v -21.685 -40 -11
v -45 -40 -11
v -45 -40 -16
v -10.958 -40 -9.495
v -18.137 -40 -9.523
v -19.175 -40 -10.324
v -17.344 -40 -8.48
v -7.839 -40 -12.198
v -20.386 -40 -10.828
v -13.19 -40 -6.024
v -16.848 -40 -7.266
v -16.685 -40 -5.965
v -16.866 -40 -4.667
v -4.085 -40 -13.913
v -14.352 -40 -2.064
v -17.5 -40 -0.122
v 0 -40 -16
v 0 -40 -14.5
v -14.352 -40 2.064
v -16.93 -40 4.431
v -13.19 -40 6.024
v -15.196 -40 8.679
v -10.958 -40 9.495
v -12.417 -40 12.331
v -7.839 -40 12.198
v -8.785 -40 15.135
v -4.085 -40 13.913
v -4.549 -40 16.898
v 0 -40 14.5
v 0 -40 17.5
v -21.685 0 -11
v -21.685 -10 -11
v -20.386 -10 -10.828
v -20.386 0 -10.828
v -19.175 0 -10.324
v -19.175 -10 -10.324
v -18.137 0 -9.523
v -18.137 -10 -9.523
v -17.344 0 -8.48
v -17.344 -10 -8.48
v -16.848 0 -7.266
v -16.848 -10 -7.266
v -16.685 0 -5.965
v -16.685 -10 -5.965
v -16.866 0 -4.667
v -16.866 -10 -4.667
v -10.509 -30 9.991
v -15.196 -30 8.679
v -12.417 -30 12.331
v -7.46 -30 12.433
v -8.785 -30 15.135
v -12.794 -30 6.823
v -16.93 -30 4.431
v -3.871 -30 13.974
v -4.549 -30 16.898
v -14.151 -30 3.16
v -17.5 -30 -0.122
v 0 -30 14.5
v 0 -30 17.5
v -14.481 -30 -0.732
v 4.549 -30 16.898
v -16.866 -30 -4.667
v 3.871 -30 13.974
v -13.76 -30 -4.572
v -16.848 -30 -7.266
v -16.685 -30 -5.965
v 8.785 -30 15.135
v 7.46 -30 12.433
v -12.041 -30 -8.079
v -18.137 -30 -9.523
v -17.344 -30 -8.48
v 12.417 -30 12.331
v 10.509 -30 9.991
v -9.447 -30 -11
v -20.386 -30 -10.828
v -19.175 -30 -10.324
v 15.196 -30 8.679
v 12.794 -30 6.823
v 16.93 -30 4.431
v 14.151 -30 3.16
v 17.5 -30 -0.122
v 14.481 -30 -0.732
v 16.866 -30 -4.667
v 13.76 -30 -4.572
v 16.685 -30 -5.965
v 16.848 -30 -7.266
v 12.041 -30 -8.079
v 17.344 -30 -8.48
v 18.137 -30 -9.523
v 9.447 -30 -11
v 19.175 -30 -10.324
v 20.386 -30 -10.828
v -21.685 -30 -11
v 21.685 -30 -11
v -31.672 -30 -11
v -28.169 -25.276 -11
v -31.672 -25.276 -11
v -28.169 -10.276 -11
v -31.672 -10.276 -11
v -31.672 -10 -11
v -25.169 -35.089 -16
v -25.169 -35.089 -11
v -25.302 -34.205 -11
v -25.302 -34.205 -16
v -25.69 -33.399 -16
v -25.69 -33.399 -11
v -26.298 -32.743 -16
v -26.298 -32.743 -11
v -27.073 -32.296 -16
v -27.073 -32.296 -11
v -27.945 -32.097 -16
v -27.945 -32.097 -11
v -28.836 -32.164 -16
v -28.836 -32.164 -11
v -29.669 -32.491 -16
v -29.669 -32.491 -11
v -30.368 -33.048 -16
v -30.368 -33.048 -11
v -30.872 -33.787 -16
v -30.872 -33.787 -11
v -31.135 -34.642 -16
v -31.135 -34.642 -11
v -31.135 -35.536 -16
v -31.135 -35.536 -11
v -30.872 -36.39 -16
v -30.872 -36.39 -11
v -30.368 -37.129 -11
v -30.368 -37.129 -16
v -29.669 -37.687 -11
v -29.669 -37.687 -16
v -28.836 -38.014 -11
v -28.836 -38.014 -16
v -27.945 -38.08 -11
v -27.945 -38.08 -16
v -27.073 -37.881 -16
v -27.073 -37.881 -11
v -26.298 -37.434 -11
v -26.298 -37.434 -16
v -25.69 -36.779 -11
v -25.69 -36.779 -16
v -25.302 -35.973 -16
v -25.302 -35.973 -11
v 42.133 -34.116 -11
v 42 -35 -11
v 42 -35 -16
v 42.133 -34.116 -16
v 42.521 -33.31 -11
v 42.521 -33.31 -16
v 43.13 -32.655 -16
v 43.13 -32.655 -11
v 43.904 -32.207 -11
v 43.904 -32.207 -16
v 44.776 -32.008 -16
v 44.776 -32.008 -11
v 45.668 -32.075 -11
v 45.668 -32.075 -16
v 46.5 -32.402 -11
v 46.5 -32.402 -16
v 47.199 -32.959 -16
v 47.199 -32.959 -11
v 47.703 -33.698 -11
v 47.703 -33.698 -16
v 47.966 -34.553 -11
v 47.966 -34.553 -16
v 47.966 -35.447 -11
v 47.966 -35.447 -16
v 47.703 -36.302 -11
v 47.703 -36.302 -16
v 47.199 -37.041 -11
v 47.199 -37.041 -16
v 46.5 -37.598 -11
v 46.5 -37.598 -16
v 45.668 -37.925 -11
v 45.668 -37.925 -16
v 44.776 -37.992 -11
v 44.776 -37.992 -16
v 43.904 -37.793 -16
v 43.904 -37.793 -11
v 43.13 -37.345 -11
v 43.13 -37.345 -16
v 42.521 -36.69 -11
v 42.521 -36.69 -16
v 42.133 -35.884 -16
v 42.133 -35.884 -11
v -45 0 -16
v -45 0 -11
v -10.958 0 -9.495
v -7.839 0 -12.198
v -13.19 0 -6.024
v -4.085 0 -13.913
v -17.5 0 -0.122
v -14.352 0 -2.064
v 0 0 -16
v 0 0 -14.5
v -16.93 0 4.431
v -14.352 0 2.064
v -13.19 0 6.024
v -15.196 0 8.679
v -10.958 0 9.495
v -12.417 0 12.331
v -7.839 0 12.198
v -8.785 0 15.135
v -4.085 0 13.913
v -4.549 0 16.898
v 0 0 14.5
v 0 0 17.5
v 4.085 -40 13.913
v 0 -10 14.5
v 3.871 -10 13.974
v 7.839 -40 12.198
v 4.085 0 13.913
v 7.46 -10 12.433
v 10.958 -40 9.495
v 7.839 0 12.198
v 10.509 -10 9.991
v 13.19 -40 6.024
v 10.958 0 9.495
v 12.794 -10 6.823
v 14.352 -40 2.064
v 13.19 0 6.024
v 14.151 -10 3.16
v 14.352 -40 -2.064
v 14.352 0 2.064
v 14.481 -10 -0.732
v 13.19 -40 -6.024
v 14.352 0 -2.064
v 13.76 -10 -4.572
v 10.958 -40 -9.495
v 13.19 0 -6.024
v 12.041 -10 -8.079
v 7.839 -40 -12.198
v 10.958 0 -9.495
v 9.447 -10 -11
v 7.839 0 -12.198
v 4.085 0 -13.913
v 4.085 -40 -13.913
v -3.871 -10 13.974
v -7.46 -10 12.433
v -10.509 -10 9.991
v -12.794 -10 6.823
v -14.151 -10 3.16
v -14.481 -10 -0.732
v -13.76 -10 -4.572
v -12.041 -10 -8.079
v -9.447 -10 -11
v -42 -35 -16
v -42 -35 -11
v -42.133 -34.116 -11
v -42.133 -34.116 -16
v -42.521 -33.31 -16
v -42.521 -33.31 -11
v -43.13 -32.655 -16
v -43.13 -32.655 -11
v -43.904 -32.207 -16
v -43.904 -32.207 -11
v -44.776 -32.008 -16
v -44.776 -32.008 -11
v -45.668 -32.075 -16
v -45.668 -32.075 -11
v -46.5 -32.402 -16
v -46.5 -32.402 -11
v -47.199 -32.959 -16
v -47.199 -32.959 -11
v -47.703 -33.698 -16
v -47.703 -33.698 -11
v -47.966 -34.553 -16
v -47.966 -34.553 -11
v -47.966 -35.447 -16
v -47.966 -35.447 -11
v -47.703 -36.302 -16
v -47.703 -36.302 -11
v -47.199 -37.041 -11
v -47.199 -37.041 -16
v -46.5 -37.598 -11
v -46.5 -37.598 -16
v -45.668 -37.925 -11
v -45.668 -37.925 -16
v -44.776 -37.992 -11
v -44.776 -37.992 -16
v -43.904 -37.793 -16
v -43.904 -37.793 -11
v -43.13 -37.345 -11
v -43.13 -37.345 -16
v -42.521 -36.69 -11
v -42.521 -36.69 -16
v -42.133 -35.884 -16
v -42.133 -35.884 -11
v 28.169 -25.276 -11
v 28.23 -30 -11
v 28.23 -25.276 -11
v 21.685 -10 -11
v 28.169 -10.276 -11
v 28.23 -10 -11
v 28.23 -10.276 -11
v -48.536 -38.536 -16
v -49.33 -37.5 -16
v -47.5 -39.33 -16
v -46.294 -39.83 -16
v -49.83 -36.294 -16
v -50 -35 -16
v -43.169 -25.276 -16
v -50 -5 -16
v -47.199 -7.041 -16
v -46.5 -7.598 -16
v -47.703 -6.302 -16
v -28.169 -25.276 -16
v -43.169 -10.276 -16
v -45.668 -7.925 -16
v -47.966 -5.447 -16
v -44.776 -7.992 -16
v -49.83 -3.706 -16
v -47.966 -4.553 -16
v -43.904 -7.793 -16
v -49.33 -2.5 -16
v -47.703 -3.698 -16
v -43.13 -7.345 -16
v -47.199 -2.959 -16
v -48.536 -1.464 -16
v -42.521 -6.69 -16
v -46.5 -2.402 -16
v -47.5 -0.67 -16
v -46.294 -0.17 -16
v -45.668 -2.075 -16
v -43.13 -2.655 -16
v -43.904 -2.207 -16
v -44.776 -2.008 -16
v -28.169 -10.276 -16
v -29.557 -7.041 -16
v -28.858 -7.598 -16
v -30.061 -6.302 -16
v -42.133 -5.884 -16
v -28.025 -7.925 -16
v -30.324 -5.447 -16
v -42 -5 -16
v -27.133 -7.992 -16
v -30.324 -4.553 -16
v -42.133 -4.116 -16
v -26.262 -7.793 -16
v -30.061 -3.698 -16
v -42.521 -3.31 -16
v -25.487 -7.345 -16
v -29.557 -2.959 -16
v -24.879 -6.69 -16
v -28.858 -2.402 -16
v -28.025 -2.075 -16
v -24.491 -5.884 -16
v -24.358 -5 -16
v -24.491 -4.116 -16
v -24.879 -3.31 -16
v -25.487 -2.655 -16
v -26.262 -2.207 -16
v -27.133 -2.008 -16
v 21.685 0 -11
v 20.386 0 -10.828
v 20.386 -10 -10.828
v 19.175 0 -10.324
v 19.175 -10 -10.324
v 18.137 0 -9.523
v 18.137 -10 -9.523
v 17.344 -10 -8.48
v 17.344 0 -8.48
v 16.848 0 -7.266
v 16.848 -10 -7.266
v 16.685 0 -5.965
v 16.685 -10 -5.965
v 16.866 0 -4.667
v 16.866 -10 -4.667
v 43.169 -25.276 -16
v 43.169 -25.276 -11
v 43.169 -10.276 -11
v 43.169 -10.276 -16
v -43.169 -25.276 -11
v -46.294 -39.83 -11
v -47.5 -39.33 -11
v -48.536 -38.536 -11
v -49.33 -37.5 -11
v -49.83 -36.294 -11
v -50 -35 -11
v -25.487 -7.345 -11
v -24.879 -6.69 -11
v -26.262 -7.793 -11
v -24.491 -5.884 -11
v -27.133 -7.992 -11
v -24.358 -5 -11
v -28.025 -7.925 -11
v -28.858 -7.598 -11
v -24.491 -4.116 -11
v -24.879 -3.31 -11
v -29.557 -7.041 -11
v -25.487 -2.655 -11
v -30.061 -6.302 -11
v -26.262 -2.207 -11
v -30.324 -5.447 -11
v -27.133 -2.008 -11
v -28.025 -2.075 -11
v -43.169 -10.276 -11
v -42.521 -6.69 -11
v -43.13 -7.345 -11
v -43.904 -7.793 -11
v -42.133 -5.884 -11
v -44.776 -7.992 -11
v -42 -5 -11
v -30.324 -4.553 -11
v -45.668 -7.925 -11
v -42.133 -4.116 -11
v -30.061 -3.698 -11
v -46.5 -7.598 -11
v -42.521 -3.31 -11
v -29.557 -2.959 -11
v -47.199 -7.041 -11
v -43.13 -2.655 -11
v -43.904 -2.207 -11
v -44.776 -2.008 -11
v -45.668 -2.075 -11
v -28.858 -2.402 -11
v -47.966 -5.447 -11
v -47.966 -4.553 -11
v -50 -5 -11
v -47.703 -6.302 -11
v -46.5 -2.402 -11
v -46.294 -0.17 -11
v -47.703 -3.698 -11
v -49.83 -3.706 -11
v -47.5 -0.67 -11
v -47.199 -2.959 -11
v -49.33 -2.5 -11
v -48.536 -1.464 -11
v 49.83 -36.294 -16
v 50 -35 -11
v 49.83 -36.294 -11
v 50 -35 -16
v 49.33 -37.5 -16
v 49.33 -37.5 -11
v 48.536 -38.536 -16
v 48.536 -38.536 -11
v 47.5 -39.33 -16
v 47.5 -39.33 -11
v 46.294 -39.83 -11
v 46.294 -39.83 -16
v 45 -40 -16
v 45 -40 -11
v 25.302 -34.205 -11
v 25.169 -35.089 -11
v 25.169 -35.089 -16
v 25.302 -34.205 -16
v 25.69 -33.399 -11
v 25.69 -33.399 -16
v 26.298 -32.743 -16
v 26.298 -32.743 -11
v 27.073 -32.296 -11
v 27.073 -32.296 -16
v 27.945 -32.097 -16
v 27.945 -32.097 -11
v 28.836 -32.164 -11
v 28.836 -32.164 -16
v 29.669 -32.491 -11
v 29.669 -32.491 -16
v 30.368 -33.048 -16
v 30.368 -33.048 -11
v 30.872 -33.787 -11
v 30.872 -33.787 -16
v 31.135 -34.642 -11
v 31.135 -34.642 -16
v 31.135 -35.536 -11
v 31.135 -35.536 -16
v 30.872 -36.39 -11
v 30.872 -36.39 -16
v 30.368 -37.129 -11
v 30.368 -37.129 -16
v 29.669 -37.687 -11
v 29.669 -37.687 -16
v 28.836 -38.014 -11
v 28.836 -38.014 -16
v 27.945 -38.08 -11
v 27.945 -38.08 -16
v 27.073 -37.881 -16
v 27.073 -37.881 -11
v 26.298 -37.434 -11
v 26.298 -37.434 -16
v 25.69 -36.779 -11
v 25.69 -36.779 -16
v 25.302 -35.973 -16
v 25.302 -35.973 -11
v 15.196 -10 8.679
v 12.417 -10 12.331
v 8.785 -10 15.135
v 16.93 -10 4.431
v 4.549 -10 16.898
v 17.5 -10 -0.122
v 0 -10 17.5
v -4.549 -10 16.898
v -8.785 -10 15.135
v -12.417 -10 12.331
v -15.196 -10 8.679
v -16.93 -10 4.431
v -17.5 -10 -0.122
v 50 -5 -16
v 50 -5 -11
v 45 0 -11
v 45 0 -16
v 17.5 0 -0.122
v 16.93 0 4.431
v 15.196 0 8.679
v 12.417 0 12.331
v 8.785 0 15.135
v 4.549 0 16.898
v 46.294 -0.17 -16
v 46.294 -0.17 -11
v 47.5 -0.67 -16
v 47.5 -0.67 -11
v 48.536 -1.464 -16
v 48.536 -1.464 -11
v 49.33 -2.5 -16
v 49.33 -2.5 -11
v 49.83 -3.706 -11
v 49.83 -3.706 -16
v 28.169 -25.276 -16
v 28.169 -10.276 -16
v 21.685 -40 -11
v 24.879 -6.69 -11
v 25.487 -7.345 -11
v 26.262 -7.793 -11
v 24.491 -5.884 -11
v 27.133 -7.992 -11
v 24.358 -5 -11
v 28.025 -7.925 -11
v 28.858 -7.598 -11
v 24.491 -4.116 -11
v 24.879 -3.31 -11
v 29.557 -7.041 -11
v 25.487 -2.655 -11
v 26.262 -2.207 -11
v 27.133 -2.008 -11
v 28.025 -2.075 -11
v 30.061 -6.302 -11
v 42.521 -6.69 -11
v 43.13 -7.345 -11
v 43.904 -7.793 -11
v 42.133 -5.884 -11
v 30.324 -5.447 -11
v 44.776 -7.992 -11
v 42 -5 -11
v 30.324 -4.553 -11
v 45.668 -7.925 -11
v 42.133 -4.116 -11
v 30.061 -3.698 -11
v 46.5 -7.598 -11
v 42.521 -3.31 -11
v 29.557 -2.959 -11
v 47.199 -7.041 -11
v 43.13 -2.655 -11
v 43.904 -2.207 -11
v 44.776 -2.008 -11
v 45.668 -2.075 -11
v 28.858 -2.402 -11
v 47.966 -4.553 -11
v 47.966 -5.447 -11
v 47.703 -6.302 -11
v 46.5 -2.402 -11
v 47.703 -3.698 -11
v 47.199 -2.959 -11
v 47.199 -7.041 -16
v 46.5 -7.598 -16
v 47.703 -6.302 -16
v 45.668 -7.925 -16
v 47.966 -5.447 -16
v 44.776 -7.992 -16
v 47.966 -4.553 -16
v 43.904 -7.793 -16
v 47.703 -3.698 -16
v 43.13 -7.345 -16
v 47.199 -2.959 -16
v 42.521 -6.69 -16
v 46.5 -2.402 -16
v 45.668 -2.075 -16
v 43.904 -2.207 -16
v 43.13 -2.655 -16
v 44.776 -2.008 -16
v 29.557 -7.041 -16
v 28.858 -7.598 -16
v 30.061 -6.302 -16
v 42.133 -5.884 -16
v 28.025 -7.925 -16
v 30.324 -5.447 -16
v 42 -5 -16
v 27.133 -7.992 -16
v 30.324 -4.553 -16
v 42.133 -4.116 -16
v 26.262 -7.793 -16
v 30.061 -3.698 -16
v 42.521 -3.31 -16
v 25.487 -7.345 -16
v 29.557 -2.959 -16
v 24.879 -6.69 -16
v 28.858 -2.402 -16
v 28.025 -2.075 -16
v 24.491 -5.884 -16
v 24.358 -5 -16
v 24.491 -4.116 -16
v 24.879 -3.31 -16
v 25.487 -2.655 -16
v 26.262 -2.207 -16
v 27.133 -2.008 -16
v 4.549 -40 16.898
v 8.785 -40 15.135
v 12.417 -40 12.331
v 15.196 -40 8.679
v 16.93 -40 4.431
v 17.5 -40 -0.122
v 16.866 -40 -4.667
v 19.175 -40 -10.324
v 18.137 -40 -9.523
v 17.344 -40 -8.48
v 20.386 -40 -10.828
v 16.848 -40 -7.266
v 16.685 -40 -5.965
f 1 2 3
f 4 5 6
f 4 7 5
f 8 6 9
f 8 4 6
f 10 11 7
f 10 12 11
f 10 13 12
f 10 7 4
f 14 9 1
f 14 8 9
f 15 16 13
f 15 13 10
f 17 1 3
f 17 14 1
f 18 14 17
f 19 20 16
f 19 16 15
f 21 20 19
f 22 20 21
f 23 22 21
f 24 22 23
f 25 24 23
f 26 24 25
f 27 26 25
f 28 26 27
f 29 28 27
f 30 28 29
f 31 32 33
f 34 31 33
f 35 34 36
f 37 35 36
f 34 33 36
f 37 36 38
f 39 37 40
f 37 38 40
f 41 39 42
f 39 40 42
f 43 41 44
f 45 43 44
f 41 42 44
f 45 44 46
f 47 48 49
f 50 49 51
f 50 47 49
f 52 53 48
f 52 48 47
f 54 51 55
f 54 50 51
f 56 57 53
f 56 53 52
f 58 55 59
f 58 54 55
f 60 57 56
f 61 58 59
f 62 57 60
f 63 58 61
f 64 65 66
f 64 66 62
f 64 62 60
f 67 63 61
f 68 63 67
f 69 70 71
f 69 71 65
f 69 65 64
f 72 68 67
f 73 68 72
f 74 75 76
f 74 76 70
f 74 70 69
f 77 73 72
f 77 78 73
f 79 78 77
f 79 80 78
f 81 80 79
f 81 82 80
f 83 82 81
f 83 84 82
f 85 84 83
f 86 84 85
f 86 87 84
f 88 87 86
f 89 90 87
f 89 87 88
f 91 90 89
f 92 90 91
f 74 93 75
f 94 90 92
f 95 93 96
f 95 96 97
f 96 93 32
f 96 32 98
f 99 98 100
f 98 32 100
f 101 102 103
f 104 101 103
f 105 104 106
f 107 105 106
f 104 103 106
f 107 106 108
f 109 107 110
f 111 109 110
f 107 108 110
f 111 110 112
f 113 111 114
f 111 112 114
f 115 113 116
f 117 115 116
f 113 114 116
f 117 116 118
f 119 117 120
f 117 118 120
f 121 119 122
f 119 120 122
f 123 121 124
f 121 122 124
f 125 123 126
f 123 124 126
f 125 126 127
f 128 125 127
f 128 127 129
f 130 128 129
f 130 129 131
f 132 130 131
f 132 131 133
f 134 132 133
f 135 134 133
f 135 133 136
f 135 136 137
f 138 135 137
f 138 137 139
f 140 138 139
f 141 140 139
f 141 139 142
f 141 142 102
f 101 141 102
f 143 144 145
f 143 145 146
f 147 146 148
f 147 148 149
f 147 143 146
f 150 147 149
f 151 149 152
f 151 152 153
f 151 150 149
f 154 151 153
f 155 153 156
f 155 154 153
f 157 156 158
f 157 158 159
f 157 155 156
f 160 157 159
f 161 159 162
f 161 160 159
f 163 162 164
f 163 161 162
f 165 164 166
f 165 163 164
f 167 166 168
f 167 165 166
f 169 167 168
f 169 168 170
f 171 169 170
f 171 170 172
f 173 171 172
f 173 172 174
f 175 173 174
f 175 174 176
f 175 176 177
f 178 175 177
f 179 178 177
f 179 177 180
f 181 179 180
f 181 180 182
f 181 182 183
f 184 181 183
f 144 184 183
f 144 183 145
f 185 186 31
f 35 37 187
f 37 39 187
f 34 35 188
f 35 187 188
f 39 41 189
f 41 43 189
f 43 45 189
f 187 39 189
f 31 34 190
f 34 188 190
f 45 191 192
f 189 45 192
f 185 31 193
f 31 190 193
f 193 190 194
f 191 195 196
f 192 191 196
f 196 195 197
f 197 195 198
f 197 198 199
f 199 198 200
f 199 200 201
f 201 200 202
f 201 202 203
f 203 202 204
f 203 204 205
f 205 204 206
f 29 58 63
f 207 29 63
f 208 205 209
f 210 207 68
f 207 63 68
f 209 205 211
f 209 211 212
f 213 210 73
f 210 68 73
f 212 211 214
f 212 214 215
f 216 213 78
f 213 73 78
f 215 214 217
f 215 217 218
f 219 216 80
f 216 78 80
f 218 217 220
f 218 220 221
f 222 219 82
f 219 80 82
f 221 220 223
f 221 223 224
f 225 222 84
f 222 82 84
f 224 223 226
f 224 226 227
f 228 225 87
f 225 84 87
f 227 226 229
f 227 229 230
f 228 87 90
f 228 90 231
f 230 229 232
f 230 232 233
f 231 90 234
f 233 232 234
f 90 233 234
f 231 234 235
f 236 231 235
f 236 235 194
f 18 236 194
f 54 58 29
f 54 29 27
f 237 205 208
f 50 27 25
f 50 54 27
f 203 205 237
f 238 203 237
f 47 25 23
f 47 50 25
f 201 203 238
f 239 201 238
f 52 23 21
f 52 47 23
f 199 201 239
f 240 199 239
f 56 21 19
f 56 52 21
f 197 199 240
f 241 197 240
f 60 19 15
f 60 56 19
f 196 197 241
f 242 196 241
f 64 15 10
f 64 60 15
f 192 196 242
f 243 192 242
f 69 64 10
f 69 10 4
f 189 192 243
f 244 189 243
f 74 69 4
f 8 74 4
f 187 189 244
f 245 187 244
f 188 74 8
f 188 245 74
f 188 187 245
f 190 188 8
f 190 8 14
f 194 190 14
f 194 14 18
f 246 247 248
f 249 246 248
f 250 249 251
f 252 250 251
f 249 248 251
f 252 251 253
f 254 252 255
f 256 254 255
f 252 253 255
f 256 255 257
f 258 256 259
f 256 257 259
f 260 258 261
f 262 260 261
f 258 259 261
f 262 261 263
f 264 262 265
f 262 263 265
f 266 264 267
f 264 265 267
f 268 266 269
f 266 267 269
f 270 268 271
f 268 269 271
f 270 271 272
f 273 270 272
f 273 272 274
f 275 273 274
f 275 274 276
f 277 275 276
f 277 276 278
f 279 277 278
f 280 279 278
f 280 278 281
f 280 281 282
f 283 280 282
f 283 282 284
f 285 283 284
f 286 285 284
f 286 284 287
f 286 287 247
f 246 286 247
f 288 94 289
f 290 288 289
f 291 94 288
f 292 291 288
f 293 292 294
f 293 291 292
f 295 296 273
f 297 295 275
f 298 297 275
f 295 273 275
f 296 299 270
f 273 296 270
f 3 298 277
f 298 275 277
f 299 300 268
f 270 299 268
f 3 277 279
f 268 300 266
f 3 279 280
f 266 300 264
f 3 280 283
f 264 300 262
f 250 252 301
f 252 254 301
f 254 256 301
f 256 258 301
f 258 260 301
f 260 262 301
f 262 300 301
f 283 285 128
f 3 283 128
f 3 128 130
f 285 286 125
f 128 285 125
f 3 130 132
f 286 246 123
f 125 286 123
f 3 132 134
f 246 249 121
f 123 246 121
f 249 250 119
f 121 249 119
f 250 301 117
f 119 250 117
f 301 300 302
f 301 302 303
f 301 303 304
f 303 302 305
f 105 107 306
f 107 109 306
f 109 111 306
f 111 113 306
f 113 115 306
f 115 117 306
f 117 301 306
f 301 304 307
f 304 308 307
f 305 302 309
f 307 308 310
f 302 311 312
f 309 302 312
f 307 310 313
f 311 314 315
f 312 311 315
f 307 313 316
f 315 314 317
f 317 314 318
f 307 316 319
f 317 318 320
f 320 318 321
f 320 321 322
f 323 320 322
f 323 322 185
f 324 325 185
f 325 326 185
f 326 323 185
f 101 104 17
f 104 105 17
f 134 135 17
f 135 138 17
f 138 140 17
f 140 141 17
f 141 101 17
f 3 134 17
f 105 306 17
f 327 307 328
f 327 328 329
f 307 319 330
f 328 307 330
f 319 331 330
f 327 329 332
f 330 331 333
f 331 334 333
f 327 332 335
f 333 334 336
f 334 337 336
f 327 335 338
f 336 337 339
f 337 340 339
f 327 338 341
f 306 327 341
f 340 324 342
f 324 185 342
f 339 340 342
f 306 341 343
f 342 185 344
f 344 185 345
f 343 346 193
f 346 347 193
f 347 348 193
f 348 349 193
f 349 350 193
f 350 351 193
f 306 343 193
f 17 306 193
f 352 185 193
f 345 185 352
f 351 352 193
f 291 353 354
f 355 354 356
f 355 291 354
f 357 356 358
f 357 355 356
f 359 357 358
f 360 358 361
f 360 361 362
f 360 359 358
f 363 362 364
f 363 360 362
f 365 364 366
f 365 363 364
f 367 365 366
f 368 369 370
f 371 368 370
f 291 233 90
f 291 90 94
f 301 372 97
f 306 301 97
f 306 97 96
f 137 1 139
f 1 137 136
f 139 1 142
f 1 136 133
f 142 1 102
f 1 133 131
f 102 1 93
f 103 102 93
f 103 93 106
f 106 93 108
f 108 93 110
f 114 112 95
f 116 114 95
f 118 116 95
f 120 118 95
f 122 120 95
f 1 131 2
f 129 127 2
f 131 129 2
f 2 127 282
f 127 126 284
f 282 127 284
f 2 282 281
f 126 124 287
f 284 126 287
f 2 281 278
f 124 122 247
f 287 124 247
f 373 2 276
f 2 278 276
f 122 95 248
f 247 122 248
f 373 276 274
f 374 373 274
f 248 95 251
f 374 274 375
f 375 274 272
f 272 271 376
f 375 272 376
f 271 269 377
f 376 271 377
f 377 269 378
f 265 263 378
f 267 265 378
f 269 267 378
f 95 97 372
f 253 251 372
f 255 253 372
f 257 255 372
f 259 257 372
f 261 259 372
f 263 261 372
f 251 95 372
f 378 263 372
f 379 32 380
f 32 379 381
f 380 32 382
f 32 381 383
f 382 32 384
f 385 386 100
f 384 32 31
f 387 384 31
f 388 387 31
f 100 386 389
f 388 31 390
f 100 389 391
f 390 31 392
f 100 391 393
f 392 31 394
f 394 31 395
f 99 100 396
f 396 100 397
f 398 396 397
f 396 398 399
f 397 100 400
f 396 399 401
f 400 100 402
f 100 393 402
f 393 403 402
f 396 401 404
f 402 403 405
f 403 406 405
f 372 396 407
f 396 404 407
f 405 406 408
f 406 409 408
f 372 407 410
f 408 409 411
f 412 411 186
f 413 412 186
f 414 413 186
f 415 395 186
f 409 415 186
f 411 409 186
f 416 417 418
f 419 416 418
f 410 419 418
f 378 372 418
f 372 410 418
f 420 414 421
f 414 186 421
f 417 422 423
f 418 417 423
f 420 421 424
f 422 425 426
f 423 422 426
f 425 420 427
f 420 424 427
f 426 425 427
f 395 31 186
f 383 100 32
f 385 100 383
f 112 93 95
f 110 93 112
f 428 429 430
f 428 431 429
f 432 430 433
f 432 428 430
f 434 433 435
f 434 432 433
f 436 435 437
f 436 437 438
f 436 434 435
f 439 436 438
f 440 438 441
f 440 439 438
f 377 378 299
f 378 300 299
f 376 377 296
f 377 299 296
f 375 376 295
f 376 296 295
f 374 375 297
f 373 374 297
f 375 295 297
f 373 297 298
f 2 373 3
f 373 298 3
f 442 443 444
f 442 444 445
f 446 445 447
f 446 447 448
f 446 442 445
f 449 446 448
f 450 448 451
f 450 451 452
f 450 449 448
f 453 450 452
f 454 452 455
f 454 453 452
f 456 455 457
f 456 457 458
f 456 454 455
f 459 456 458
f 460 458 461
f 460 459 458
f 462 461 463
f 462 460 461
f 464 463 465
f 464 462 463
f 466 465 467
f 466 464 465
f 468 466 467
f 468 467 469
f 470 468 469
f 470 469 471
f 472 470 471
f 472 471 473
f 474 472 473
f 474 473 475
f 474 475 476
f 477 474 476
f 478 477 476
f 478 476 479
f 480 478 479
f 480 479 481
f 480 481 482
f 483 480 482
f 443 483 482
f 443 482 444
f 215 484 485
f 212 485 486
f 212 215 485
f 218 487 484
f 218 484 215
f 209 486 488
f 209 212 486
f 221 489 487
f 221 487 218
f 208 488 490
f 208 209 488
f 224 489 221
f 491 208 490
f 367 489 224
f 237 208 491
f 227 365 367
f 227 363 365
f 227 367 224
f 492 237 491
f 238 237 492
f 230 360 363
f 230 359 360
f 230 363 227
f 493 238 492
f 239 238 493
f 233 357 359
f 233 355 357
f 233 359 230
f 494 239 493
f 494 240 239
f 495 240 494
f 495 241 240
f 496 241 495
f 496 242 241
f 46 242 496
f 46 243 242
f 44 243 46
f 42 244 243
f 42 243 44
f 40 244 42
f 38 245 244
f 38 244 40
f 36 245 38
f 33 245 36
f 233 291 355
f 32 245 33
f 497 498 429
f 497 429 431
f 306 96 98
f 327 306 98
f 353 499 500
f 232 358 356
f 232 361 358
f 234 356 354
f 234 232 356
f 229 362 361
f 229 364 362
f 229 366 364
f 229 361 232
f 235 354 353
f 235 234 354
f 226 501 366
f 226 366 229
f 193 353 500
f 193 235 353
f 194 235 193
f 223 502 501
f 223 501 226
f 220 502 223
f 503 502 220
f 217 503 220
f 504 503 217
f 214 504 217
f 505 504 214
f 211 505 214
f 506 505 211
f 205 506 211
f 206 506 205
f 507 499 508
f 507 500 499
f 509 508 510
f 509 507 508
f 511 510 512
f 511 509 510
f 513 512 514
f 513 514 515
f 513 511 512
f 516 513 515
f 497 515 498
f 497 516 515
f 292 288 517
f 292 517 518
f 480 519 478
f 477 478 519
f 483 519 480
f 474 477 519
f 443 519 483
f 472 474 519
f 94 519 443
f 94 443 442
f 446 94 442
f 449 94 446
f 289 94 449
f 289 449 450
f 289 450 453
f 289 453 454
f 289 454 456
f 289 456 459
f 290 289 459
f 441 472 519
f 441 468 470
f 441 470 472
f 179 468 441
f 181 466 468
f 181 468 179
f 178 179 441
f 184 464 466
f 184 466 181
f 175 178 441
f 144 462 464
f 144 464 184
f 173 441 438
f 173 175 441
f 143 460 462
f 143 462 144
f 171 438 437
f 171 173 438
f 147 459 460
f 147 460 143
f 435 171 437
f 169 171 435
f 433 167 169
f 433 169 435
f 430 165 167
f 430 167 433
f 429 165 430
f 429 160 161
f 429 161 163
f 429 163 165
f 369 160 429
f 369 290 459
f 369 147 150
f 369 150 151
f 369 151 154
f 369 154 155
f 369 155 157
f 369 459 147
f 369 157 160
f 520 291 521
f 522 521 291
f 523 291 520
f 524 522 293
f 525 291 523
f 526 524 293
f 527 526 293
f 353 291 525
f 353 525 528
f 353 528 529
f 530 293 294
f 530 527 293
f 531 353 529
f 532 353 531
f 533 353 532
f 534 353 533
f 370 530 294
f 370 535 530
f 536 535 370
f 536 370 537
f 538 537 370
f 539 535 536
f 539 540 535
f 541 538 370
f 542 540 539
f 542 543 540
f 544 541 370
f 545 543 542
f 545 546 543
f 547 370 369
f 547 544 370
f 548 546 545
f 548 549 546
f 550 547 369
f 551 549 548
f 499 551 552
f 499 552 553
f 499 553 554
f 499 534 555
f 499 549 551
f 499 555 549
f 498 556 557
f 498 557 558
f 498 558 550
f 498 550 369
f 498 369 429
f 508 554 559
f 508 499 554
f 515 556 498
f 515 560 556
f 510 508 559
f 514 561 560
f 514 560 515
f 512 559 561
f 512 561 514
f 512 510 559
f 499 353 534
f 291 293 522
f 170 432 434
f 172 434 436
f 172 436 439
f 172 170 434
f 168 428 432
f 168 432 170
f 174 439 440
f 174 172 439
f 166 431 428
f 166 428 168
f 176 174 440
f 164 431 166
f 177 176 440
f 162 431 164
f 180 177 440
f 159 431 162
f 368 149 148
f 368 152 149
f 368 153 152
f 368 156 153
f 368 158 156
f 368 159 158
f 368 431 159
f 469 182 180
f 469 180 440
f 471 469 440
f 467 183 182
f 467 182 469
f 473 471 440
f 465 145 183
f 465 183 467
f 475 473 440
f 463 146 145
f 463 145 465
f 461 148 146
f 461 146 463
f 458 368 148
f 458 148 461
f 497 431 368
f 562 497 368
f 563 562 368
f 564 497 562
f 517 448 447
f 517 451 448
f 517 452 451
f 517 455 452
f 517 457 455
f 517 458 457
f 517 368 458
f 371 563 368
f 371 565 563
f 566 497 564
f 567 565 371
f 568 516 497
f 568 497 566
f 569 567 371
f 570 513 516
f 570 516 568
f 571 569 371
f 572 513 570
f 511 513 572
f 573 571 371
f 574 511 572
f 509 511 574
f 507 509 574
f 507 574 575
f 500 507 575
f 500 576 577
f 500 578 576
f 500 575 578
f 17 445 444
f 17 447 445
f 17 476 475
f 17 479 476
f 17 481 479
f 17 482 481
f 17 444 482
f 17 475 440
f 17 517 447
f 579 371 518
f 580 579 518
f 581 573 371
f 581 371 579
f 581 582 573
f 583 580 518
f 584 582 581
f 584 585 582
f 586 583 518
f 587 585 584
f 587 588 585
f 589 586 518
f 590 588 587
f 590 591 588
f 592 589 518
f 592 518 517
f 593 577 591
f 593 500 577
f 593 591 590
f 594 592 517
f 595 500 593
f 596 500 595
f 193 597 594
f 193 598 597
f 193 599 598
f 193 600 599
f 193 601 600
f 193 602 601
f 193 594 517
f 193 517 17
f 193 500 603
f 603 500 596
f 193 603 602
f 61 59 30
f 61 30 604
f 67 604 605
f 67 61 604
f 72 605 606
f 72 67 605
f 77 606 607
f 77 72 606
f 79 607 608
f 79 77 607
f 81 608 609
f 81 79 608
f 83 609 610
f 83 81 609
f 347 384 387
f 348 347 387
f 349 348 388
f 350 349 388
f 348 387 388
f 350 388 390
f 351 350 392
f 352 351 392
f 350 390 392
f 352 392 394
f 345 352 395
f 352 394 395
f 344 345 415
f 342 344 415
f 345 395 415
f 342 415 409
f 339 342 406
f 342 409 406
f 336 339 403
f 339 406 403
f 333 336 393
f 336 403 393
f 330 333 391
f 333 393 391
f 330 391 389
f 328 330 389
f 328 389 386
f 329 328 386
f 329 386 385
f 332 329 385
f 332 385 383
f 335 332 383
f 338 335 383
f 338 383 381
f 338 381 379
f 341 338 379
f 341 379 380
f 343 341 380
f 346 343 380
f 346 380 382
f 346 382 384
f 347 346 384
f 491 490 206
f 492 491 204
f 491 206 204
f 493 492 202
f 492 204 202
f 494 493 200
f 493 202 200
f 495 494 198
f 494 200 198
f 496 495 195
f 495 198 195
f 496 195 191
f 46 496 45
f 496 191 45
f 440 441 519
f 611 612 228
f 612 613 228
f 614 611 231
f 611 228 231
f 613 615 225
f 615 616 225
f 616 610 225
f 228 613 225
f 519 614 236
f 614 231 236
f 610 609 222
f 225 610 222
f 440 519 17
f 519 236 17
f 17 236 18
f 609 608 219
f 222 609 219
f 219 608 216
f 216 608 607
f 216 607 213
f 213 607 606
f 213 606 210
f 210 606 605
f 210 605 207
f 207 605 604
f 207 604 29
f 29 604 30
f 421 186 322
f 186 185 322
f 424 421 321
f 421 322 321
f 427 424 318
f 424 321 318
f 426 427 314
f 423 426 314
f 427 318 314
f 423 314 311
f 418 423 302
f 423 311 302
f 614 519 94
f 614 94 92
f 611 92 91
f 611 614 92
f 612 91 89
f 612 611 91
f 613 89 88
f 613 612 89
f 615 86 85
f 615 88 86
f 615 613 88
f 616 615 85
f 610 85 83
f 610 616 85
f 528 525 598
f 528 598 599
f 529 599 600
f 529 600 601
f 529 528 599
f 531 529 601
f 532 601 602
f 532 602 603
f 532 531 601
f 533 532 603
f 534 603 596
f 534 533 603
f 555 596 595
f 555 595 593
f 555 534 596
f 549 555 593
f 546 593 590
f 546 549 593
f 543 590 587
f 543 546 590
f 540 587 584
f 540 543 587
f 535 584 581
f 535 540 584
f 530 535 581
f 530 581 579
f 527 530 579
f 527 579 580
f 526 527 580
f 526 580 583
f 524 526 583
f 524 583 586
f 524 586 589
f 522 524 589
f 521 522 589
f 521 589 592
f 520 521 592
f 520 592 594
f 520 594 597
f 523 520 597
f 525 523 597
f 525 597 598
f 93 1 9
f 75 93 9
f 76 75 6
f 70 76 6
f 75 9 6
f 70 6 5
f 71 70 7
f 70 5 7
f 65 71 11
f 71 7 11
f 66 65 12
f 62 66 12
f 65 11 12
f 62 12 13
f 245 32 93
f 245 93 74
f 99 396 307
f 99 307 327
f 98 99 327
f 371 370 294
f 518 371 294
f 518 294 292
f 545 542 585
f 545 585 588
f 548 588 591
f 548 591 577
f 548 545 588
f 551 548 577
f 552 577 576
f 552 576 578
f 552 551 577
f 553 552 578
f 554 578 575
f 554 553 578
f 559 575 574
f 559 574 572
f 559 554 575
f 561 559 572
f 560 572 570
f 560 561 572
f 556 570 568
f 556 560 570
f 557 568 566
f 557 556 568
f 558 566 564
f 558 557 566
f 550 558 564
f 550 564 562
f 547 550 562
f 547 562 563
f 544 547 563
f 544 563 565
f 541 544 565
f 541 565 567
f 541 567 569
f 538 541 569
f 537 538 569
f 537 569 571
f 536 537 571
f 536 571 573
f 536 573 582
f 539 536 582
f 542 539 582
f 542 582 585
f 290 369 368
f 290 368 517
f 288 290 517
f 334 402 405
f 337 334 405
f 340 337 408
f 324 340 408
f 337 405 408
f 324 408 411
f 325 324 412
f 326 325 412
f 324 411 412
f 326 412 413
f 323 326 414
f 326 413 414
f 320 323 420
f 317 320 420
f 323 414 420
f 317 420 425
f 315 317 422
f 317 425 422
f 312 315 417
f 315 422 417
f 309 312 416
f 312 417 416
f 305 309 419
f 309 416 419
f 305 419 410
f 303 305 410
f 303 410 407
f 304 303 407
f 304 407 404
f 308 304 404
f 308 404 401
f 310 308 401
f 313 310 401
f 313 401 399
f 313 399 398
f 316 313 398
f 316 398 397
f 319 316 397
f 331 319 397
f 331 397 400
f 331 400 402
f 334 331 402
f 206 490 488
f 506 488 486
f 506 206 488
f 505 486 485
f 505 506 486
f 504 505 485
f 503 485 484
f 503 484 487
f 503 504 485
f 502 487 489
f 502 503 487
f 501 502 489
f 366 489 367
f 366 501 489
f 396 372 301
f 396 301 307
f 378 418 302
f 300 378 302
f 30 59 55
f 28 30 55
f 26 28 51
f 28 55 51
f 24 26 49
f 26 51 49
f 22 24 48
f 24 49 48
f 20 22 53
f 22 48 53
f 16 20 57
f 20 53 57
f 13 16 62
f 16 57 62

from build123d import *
from build123d import SkipClean  # not in build123d's __all__

# Parameters (mm, degrees)
F0_R      = 14.5
F1_DEPTH  = 40
F2_R      = 5
F3_R      = 5
F4_W      = 15
F4_H      = 15
F4_R      = 3
F5_DEPTH  = 25
F6_W      = 110.2663613856
F6_H      = 71.1540803313
F7_DEPTH  = 50.001
F9_W      = 49.9149149903
F9_H      = 20
F10_DEPTH = 28.501


with BuildPart() as f1:
    # F0 (on Front) → F1 (new body)
    with BuildSketch(Plane.XZ):
        with BuildLine():
            Line((-13.6106575888, -11), (-50, -11))
            Line((-50, -11), (-50, -16))
            Line((-50, -16), (50, -16))
            Line((50, -16), (50, -11))
            Line((50, -11), (13.6106575888, -11))
            ThreePointArc((13.6106575888, -11), (0, 17.5), (-13.6106575888, -11))
        make_face()
        Circle(F0_R, mode=Mode.SUBTRACT)
    extrude(amount=F1_DEPTH)

    # F2
    f2_edges = [f1.edges().sort_by_distance(p)[0] for p in [
        (13.610658, -20, -11),
        (-13.610658, -20, -11),
    ]]
    fillet(f2_edges, radius=F2_R)

    # F3
    f3_edges = [f1.edges().sort_by_distance(p)[0] for p in [
        (50, -40, -13.5),
        (-50, -40, -13.5),
        (50, 0, -13.5),
        (-50, 0, -13.5),
    ]]
    fillet(f3_edges, radius=F3_R)

    # F4 (on face) → F5 (cut)
    with BuildSketch(Plane.XY.offset(-11)):
        with Locations((-35.6688876305, -17.775596238)):
            Rectangle(F4_W, F4_H)
        with Locations((-45, -35)):
            Circle(F4_R)
        with Locations((-28.1688876305, -35.0887903643)):
            Circle(F4_R)
        with Locations((-45, -5)):
            Circle(F4_R)
        with Locations((-27.3576099426, -5)):
            Circle(F4_R)
    extrude(amount=-F5_DEPTH, mode=Mode.SUBTRACT)

    # F6 (on Right) → F7 (cut, through all)
    with BuildSketch(Plane.YZ):
        with Locations((-21.3294159621, -6.3556879759)):
            Rectangle(F6_W, F6_H)
    extrude(amount=F7_DEPTH, mode=Mode.SUBTRACT)

    # F8: F1 across plane


with BuildPart() as f1_1:
    add(f1.part, clean=False)
    with SkipClean():  # cleaning this boolean's faces spoils the solid; the shape is the same uncleaned
        add(f1.part.mirror(Plane.YZ), clean=False)

    # F9 (on face) → F10 (cut, through all)
    with BuildSketch(Plane.XY.offset(-11)):
        Polygon((-21.6852484422, -10), (-31.6722874067, -10), (-31.6722874067, -10.275596238), (-28.1688876305, -10.275596238), (-28.1688876305, -25.275596238), (-31.6722874067, -25.275596238), (-31.6722874067, -30), (-21.6852484422, -30), align=None)
        with Locations((3.272209053, -20)):
            Rectangle(F9_W, F9_H)
    with SkipClean():  # cleaning this boolean's faces spoils the solid; the shape is the same uncleaned
        extrude(amount=F10_DEPTH, mode=Mode.SUBTRACT)


solid = f1_1.part
